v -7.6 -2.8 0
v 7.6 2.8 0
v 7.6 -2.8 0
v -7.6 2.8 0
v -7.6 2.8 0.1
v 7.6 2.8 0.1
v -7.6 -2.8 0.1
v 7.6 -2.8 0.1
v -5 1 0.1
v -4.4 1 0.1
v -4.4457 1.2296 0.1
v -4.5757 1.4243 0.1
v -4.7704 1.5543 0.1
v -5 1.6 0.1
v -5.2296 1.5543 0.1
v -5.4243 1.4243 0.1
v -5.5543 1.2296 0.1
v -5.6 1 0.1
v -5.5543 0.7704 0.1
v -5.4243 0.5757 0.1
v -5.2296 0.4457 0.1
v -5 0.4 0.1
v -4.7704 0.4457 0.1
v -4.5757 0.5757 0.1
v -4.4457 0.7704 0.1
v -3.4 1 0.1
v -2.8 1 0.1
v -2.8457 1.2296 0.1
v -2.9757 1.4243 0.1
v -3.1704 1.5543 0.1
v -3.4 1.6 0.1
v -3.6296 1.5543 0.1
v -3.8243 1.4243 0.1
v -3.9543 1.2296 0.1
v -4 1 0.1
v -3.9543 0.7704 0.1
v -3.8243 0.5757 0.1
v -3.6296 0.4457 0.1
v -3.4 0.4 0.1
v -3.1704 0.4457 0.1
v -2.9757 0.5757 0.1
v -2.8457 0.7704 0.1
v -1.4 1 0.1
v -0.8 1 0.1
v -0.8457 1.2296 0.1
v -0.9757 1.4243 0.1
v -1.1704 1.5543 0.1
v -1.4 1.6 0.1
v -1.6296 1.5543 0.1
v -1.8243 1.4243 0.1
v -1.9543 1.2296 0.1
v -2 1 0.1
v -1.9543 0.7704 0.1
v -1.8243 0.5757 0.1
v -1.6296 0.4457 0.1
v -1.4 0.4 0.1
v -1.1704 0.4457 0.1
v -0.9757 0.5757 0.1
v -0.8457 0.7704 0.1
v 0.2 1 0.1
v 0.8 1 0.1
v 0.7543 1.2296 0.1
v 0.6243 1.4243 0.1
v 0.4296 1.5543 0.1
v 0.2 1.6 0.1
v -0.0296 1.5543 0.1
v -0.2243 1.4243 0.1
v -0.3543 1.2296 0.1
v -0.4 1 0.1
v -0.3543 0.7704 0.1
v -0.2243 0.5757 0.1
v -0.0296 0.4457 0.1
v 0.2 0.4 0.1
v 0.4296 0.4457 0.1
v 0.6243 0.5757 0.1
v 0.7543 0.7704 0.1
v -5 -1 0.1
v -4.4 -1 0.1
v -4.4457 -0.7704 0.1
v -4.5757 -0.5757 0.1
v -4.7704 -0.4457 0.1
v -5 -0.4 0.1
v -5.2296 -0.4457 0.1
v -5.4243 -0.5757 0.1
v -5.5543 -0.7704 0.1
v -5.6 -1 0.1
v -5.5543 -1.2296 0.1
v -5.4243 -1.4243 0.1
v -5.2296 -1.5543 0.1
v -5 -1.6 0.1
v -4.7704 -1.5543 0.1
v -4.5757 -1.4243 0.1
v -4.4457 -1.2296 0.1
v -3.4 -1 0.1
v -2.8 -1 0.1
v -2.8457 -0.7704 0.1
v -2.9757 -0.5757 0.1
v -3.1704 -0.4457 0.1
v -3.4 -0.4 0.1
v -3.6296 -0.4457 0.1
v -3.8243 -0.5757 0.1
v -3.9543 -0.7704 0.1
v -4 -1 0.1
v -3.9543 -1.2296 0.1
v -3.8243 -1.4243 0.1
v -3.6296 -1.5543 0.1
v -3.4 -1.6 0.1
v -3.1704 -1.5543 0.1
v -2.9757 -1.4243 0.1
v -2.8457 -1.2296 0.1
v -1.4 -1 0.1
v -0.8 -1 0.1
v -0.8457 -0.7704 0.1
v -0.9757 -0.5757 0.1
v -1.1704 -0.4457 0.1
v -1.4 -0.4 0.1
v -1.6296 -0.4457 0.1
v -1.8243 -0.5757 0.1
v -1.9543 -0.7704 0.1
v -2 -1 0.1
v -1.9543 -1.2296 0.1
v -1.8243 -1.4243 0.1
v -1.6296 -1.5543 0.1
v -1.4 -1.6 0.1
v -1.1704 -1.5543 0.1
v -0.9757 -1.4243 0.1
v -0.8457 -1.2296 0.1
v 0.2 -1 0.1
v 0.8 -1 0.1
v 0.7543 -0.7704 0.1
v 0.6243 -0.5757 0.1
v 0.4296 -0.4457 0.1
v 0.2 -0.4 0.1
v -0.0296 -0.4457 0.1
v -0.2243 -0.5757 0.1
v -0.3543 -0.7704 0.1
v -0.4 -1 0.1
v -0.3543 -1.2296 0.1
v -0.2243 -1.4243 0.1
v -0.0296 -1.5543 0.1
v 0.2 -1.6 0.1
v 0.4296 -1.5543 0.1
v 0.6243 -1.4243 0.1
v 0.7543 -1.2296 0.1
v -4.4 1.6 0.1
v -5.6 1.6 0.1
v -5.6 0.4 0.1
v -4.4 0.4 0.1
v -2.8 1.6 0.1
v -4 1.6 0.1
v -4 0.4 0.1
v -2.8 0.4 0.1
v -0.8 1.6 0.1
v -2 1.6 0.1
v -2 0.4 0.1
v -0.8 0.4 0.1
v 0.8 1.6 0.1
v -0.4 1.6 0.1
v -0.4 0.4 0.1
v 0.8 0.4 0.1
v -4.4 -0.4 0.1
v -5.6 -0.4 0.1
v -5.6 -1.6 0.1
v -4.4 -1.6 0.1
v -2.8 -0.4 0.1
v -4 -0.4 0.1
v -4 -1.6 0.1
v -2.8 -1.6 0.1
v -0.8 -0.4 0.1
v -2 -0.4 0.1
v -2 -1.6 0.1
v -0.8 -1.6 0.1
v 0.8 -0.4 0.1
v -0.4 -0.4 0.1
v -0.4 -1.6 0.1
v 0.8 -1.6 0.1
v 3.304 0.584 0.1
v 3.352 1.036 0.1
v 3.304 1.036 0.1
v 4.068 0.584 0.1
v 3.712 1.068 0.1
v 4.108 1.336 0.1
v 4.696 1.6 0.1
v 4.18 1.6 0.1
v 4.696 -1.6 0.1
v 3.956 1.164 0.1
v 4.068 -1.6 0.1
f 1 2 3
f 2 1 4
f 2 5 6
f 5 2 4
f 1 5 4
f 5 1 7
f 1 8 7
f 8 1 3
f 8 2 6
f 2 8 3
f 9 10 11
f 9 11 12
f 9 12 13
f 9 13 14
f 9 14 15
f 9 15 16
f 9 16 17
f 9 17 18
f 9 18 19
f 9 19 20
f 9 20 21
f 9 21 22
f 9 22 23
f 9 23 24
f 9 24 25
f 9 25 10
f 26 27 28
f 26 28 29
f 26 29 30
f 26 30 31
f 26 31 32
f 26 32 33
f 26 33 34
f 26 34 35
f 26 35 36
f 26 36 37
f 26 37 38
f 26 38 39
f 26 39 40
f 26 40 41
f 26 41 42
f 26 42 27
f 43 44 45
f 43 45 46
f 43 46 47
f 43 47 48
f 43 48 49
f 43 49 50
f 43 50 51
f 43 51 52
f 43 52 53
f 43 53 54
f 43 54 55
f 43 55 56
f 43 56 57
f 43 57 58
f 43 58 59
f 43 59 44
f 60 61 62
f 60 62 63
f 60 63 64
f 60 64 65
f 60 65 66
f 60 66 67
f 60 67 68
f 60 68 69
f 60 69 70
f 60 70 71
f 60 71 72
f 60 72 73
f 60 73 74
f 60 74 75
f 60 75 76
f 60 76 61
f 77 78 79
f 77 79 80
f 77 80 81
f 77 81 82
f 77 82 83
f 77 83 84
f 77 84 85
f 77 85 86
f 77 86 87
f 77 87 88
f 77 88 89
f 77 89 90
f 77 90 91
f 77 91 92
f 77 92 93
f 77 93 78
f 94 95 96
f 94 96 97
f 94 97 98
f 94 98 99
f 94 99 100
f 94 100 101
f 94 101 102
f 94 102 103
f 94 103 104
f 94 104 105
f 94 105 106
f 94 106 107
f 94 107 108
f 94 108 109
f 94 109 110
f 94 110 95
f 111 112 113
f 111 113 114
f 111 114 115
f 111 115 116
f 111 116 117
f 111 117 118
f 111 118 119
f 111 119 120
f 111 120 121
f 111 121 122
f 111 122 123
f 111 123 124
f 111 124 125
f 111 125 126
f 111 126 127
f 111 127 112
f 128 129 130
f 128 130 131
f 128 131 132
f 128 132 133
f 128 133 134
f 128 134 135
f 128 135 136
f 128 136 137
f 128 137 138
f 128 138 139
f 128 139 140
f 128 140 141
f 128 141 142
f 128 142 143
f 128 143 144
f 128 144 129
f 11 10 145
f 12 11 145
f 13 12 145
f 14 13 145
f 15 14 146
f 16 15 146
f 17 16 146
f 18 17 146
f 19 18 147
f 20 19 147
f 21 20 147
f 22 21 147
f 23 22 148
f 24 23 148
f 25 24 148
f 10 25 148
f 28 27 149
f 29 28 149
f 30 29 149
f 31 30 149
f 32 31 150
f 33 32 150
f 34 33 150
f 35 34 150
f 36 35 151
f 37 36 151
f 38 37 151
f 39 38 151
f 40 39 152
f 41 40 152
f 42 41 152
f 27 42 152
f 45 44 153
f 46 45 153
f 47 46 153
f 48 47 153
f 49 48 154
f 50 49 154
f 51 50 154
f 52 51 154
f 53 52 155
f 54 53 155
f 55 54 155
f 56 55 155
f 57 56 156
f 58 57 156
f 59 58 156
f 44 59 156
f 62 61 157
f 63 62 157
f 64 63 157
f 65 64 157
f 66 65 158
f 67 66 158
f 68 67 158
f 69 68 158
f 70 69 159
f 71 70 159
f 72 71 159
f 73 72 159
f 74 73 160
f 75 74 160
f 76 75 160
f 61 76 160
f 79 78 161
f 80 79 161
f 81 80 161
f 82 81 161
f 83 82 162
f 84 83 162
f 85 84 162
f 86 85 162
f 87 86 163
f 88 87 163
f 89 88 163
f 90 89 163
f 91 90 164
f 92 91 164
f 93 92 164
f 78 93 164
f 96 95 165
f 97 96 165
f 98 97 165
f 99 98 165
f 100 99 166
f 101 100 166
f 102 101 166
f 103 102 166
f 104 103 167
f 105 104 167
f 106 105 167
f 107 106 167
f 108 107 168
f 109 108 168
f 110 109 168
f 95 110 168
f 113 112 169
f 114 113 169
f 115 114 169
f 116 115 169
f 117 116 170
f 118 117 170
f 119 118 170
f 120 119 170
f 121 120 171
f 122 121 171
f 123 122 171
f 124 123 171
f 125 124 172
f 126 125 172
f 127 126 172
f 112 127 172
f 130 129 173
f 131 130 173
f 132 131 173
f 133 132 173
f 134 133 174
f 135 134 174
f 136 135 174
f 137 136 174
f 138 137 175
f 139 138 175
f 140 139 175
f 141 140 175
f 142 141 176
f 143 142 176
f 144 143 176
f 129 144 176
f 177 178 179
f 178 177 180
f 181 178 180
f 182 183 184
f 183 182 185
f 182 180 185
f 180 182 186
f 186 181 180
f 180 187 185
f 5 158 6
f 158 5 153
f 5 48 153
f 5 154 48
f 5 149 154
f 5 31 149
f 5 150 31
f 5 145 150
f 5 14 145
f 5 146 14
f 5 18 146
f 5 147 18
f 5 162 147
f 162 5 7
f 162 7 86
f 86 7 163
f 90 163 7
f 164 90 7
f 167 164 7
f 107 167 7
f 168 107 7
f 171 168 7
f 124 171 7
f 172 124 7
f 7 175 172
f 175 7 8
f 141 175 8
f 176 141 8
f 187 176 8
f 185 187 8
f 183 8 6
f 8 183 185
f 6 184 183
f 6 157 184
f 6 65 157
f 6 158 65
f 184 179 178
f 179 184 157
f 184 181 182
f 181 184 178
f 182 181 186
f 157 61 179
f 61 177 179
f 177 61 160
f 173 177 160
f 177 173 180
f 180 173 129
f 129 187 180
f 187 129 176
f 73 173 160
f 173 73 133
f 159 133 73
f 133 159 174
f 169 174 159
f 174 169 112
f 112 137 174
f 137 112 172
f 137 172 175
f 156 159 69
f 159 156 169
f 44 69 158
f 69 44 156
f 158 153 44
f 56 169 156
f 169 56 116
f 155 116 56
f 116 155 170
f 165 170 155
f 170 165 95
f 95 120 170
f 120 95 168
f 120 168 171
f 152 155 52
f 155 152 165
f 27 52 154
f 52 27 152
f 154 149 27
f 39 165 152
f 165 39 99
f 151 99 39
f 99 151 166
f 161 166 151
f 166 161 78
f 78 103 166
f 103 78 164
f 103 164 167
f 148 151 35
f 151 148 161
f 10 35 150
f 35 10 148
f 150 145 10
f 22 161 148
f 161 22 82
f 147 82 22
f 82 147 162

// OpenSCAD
// file: ../p/box5-12.scad
use <../lib.scad>
function ldraw_lib__box5_12() = [
// 0 Box with 5 Faces without Any Edges
// 0 Name: box5-12.dat
// 0 Author: Chris Dee [cwdee]
// 0 !LDRAW_ORG Primitive UPDATE 2009-02
// 0 !LICENSE Licensed under CC BY 4.0 : see CAreadme.txt
// 
// 0 BFC CERTIFY CCW
  [0,"BFC","CERTIFY"],
  [0,"BFC","CCW"],
// 
// 0 !HISTORY 2009-09-03 [PTadmin] Official Update 2009-02
// 
// 
// 4 16 1 1 1 1 1 -1 -1 1 -1 -1 1 1
  [4,16,1,1,1,1,1,-1,-1,1,-1,-1,1,1],
// 4 16 -1 0 1 1 0 1 1 1 1 -1 1 1
  [4,16,-1,0,1,1,0,1,1,1,1,-1,1,1],
// 4 16 -1 0 -1 -1 0 1 -1 1 1 -1 1 -1
  [4,16,-1,0,-1,-1,0,1,-1,1,1,-1,1,-1],
// 4 16 1 0 -1 -1 0 -1 -1 1 -1 1 1 -1
  [4,16,1,0,-1,-1,0,-1,-1,1,-1,1,1,-1],
// 4 16 1 0 1 1 0 -1 1 1 -1 1 1 1
  [4,16,1,0,1,1,0,-1,1,1,-1,1,1,1],
// 0
];
module ldraw_lib__box5_12(step=0, col=false, unit=2/5, alt=false, line=0.2, solid=!$preview)
    makepoly(ldraw_lib__box5_12(), step=step, col=col, unit=unit, alt=alt, line=line, solid=solid);
ldraw_lib__box5_12(line=0.2);
// file: ../p/4-4ndis.scad
use <../lib.scad>
function ldraw_lib__4_4ndis() = [
// 0 Disc Negative 1.0
// 0 Name: 4-4ndis.dat
// 0 Author: James Jessiman
// 0 !LDRAW_ORG Primitive UPDATE 2012-01
// 0 !LICENSE Licensed under CC BY 4.0 : see CAreadme.txt
// 
// 0 BFC CERTIFY CCW
  [0,"BFC","CERTIFY"],
  [0,"BFC","CCW"],
// 
// 0 !HISTORY 2002-03-23 [sbliss] Added BFC statement; compacted code
// 0 !HISTORY 2002-04-25 [PTadmin] Official Update 2002-02
// 0 !HISTORY 2007-06-24 [PTadmin] Header formatted for Contributor Agreement
// 0 !HISTORY 2008-07-01 [PTadmin] Official Update 2008-01
// 0 !HISTORY 2012-02-16 [Philo] Changed to CCW
// 0 !HISTORY 2012-03-30 [PTadmin] Official Update 2012-01
// 
// 
// 3 16 0.9239 0 0.3827 1 0 0 1 0 1
  [3,16,0.9239,0,0.3827,1,0,0,1,0,1],
// 3 16 0.7071 0 0.7071 0.9239 0 0.3827 1 0 1
  [3,16,0.7071,0,0.7071,0.9239,0,0.3827,1,0,1],
// 3 16 0.3827 0 0.9239 0.7071 0 0.7071 1 0 1
  [3,16,0.3827,0,0.9239,0.7071,0,0.7071,1,0,1],
// 3 16 0 0 1 0.3827 0 0.9239 1 0 1
  [3,16,0,0,1,0.3827,0,0.9239,1,0,1],
// 3 16 -0.3827 0 0.9239 0 0 1 -1 0 1
  [3,16,-0.3827,0,0.9239,0,0,1,-1,0,1],
// 3 16 -0.7071 0 0.7071 -0.3827 0 0.9239 -1 0 1
  [3,16,-0.7071,0,0.7071,-0.3827,0,0.9239,-1,0,1],
// 3 16 -0.9239 0 0.3827 -0.7071 0 0.7071 -1 0 1
  [3,16,-0.9239,0,0.3827,-0.7071,0,0.7071,-1,0,1],
// 3 16 -1 0 0 -0.9239 0 0.3827 -1 0 1
  [3,16,-1,0,0,-0.9239,0,0.3827,-1,0,1],
// 3 16 -0.9239 0 -0.3827 -1 0 0 -1 0 -1
  [3,16,-0.9239,0,-0.3827,-1,0,0,-1,0,-1],
// 3 16 -0.7071 0 -0.7071 -0.9239 0 -0.3827 -1 0 -1
  [3,16,-0.7071,0,-0.7071,-0.9239,0,-0.3827,-1,0,-1],
// 3 16 -0.3827 0 -0.9239 -0.7071 0 -0.7071 -1 0 -1
  [3,16,-0.3827,0,-0.9239,-0.7071,0,-0.7071,-1,0,-1],
// 3 16 0 0 -1 -0.3827 0 -0.9239 -1 0 -1
  [3,16,0,0,-1,-0.3827,0,-0.9239,-1,0,-1],
// 3 16 0.3827 0 -0.9239 0 0 -1 1 0 -1
  [3,16,0.3827,0,-0.9239,0,0,-1,1,0,-1],
// 3 16 0.7071 0 -0.7071 0.3827 0 -0.9239 1 0 -1
  [3,16,0.7071,0,-0.7071,0.3827,0,-0.9239,1,0,-1],
// 3 16 0.9239 0 -0.3827 0.7071 0 -0.7071 1 0 -1
  [3,16,0.9239,0,-0.3827,0.7071,0,-0.7071,1,0,-1],
// 3 16 1 0 0 0.9239 0 -0.3827 1 0 -1
  [3,16,1,0,0,0.9239,0,-0.3827,1,0,-1],
];
module ldraw_lib__4_4ndis(step=0, col=false, unit=2/5, alt=false, line=0.2, solid=!$preview)
    makepoly(ldraw_lib__4_4ndis(), step=step, col=col, unit=unit, alt=alt, line=line, solid=solid);
ldraw_lib__4_4ndis(line=0.2);
// file: ../p/4-4disc.scad
use <../lib.scad>
function ldraw_lib__4_4disc() = [
// 0 Disc 1.0
// 0 Name: 4-4disc.dat
// 0 Author: James Jessiman
// 0 !LDRAW_ORG Primitive UPDATE 2002-02
// 0 !LICENSE Licensed under CC BY 4.0 : see CAreadme.txt
// 
// 0 BFC CERTIFY CCW
  [0,"BFC","CERTIFY"],
  [0,"BFC","CCW"],
// 
// 0 !HISTORY 1998-12-15 [PTadmin] Official Update 1998-10
// 0 !HISTORY 2002-03-23 [sbliss] Added BFC statement
// 0 !HISTORY 2002-04-25 [PTadmin] Official Update 2002-02
// 0 !HISTORY 2007-06-24 [PTadmin] Header formatted for Contributor Agreement
// 0 !HISTORY 2008-07-01 [PTadmin] Official Update 2008-01
// 
// 
// 3 16 0 0 0 1 0 0 0.9239 0 0.3827
  [3,16,0,0,0,1,0,0,0.9239,0,0.3827],
// 3 16 0 0 0 0.9239 0 0.3827 0.7071 0 0.7071
  [3,16,0,0,0,0.9239,0,0.3827,0.7071,0,0.7071],
// 3 16 0 0 0 0.7071 0 0.7071 0.3827 0 0.9239
  [3,16,0,0,0,0.7071,0,0.7071,0.3827,0,0.9239],
// 3 16 0 0 0 0.3827 0 0.9239 0 0 1
  [3,16,0,0,0,0.3827,0,0.9239,0,0,1],
// 3 16 0 0 0 0 0 1 -0.3827 0 0.9239
  [3,16,0,0,0,0,0,1,-0.3827,0,0.9239],
// 3 16 0 0 0 -0.3827 0 0.9239 -0.7071 0 0.7071
  [3,16,0,0,0,-0.3827,0,0.9239,-0.7071,0,0.7071],
// 3 16 0 0 0 -0.7071 0 0.7071 -0.9239 0 0.3827
  [3,16,0,0,0,-0.7071,0,0.7071,-0.9239,0,0.3827],
// 3 16 0 0 0 -0.9239 0 0.3827 -1 0 -0
  [3,16,0,0,0,-0.9239,0,0.3827,-1,0,-0],
// 3 16 0 0 0 -1 0 -0 -0.9239 0 -0.3827
  [3,16,0,0,0,-1,0,-0,-0.9239,0,-0.3827],
// 3 16 0 0 0 -0.9239 0 -0.3827 -0.7071 0 -0.7071
  [3,16,0,0,0,-0.9239,0,-0.3827,-0.7071,0,-0.7071],
// 3 16 0 0 0 -0.7071 0 -0.7071 -0.3827 0 -0.9239
  [3,16,0,0,0,-0.7071,0,-0.7071,-0.3827,0,-0.9239],
// 3 16 0 0 0 -0.3827 0 -0.9239 0 0 -1
  [3,16,0,0,0,-0.3827,0,-0.9239,0,0,-1],
// 3 16 0 0 0 0 0 -1 0.3827 0 -0.9239
  [3,16,0,0,0,0,0,-1,0.3827,0,-0.9239],
// 3 16 0 0 0 0.3827 0 -0.9239 0.7071 0 -0.7071
  [3,16,0,0,0,0.3827,0,-0.9239,0.7071,0,-0.7071],
// 3 16 0 0 0 0.7071 0 -0.7071 0.9239 0 -0.3827
  [3,16,0,0,0,0.7071,0,-0.7071,0.9239,0,-0.3827],
// 3 16 0 0 0 0.9239 0 -0.3827 1 0 0
  [3,16,0,0,0,0.9239,0,-0.3827,1,0,0],
// 0
];
module ldraw_lib__4_4disc(step=0, col=false, unit=2/5, alt=false, line=0.2, solid=!$preview)
    makepoly(ldraw_lib__4_4disc(), step=step, col=col, unit=unit, alt=alt, line=line, solid=solid);
ldraw_lib__4_4disc(line=0.2);
// main file
use <../lib.scad>
use <../p/4-4disc.scad>
use <../p/4-4ndis.scad>
use <../p/box5-12.scad>
function ldraw_lib__195555c() = [
// 0 Sticker  0.7 x  1.9 with White Dots and Number 1 on Black Background
// 0 Name: 195555c.dat
// 0 Author: Takeshi Takahashi [RainbowDolphin]
// 0 !LDRAW_ORG Part UPDATE 2025-03
// 0 !LICENSE Licensed under CC BY 4.0 : see CAreadme.txt
// 
// 0 BFC CERTIFY CCW
  [0,"BFC","CERTIFY"],
  [0,"BFC","CCW"],
// 
// 0 !KEYWORDS Bricklink 6371stk01, Brickowl 584391, Gas pump, Rebrickable 195555
// 0 !KEYWORDS Service station, Set 6371
// 
// 0 !HISTORY 2025-03-30 [OrionP] Official Update 2025-03
// 
// 
// 1 16 0 -0.25 0 19 0 0 0 0.25 0 0 0 7 box5-12.dat
  [1,16,0,-0.25,0,19,0,0,0,0.25,0,0,0,7, ldraw_lib__box5_12()],
// 1 15 -12.5 -0.25 2.5 1.5 0 0 0 1 0 0 0 1.5 4-4disc.dat
  [1,15,-12.5,-0.25,2.5,1.5,0,0,0,1,0,0,0,1.5, ldraw_lib__4_4disc()],
// 1 15 -8.5 -0.25 2.5 1.5 0 0 0 1 0 0 0 1.5 4-4disc.dat
  [1,15,-8.5,-0.25,2.5,1.5,0,0,0,1,0,0,0,1.5, ldraw_lib__4_4disc()],
// 1 15 -3.5 -0.25 2.5 1.5 0 0 0 1 0 0 0 1.5 4-4disc.dat
  [1,15,-3.5,-0.25,2.5,1.5,0,0,0,1,0,0,0,1.5, ldraw_lib__4_4disc()],
// 1 15 0.5 -0.25 2.5 1.5 0 0 0 1 0 0 0 1.5 4-4disc.dat
  [1,15,0.5,-0.25,2.5,1.5,0,0,0,1,0,0,0,1.5, ldraw_lib__4_4disc()],
// 1 15 -12.5 -0.25 -2.5 1.5 0 0 0 1 0 0 0 1.5 4-4disc.dat
  [1,15,-12.5,-0.25,-2.5,1.5,0,0,0,1,0,0,0,1.5, ldraw_lib__4_4disc()],
// 1 15 -8.5 -0.25 -2.5 1.5 0 0 0 1 0 0 0 1.5 4-4disc.dat
  [1,15,-8.5,-0.25,-2.5,1.5,0,0,0,1,0,0,0,1.5, ldraw_lib__4_4disc()],
// 1 15 -3.5 -0.25 -2.5 1.5 0 0 0 1 0 0 0 1.5 4-4disc.dat
  [1,15,-3.5,-0.25,-2.5,1.5,0,0,0,1,0,0,0,1.5, ldraw_lib__4_4disc()],
// 1 15 0.5 -0.25 -2.5 1.5 0 0 0 1 0 0 0 1.5 4-4disc.dat
  [1,15,0.5,-0.25,-2.5,1.5,0,0,0,1,0,0,0,1.5, ldraw_lib__4_4disc()],
// 1 0 -12.5 -0.25 2.5 1.5 0 0 0 1 0 0 0 1.5 4-4ndis.dat
  [1,0,-12.5,-0.25,2.5,1.5,0,0,0,1,0,0,0,1.5, ldraw_lib__4_4ndis()],
// 1 0 -8.5 -0.25 2.5 1.5 0 0 0 1 0 0 0 1.5 4-4ndis.dat
  [1,0,-8.5,-0.25,2.5,1.5,0,0,0,1,0,0,0,1.5, ldraw_lib__4_4ndis()],
// 1 0 -3.5 -0.25 2.5 1.5 0 0 0 1 0 0 0 1.5 4-4ndis.dat
  [1,0,-3.5,-0.25,2.5,1.5,0,0,0,1,0,0,0,1.5, ldraw_lib__4_4ndis()],
// 1 0 0.5 -0.25 2.5 1.5 0 0 0 1 0 0 0 1.5 4-4ndis.dat
  [1,0,0.5,-0.25,2.5,1.5,0,0,0,1,0,0,0,1.5, ldraw_lib__4_4ndis()],
// 1 0 -12.5 -0.25 -2.5 1.5 0 0 0 1 0 0 0 1.5 4-4ndis.dat
  [1,0,-12.5,-0.25,-2.5,1.5,0,0,0,1,0,0,0,1.5, ldraw_lib__4_4ndis()],
// 1 0 -8.5 -0.25 -2.5 1.5 0 0 0 1 0 0 0 1.5 4-4ndis.dat
  [1,0,-8.5,-0.25,-2.5,1.5,0,0,0,1,0,0,0,1.5, ldraw_lib__4_4ndis()],
// 1 0 -3.5 -0.25 -2.5 1.5 0 0 0 1 0 0 0 1.5 4-4ndis.dat
  [1,0,-3.5,-0.25,-2.5,1.5,0,0,0,1,0,0,0,1.5, ldraw_lib__4_4ndis()],
// 1 0 0.5 -0.25 -2.5 1.5 0 0 0 1 0 0 0 1.5 4-4ndis.dat
  [1,0,0.5,-0.25,-2.5,1.5,0,0,0,1,0,0,0,1.5, ldraw_lib__4_4ndis()],
// 4 15 8.38 -0.25 2.59 8.26 -0.25 2.59 8.26 -0.25 1.46 10.17 -0.25 1.46
  [4,15,8.38,-0.25,2.59,8.26,-0.25,2.59,8.26,-0.25,1.46,10.17,-0.25,1.46],
// 3 15 9.28 -0.25 2.67 8.38 -0.25 2.59 10.17 -0.25 1.46
  [3,15,9.28,-0.25,2.67,8.38,-0.25,2.59,10.17,-0.25,1.46],
// 4 15 10.27 -0.25 3.34 11.74 -0.25 -4 11.74 -0.25 4 10.45 -0.25 4
  [4,15,10.27,-0.25,3.34,11.74,-0.25,-4,11.74,-0.25,4,10.45,-0.25,4],
// 4 15 10.17 -0.25 1.46 11.74 -0.25 -4 10.27 -0.25 3.34 9.89 -0.25 2.91
  [4,15,10.17,-0.25,1.46,11.74,-0.25,-4,10.27,-0.25,3.34,9.89,-0.25,2.91],
// 3 15 9.89 -0.25 2.91 9.28 -0.25 2.67 10.17 -0.25 1.46
  [3,15,9.89,-0.25,2.91,9.28,-0.25,2.67,10.17,-0.25,1.46],
// 3 15 10.17 -0.25 1.46 10.17 -0.25 -4 11.74 -0.25 -4
  [3,15,10.17,-0.25,1.46,10.17,-0.25,-4,11.74,-0.25,-4],
// 4 0 -1 -0.25 4 19 -0.25 7 -19 -0.25 7 -2 -0.25 4
  [4,0,-1,-0.25,4,19,-0.25,7,-19,-0.25,7,-2,-0.25,4],
// 3 0 -19 -0.25 7 -3.5 -0.25 4 -2 -0.25 4
  [3,0,-19,-0.25,7,-3.5,-0.25,4,-2,-0.25,4],
// 3 0 -19 -0.25 7 -5 -0.25 4 -3.5 -0.25 4
  [3,0,-19,-0.25,7,-5,-0.25,4,-3.5,-0.25,4],
// 3 0 -19 -0.25 7 -7 -0.25 4 -5 -0.25 4
  [3,0,-19,-0.25,7,-7,-0.25,4,-5,-0.25,4],
// 3 0 -19 -0.25 7 -8.5 -0.25 4 -7 -0.25 4
  [3,0,-19,-0.25,7,-8.5,-0.25,4,-7,-0.25,4],
// 3 0 -19 -0.25 7 -10 -0.25 4 -8.5 -0.25 4
  [3,0,-19,-0.25,7,-10,-0.25,4,-8.5,-0.25,4],
// 3 0 -19 -0.25 7 -11 -0.25 4 -10 -0.25 4
  [3,0,-19,-0.25,7,-11,-0.25,4,-10,-0.25,4],
// 3 0 -19 -0.25 7 -12.5 -0.25 4 -11 -0.25 4
  [3,0,-19,-0.25,7,-12.5,-0.25,4,-11,-0.25,4],
// 3 0 -19 -0.25 7 -14 -0.25 4 -12.5 -0.25 4
  [3,0,-19,-0.25,7,-14,-0.25,4,-12.5,-0.25,4],
// 3 0 -19 -0.25 7 -14 -0.25 2.5 -14 -0.25 4
  [3,0,-19,-0.25,7,-14,-0.25,2.5,-14,-0.25,4],
// 3 0 -19 -0.25 7 -14 -0.25 1 -14 -0.25 2.5
  [3,0,-19,-0.25,7,-14,-0.25,1,-14,-0.25,2.5],
// 4 0 -14 -0.25 -1 -14 -0.25 1 -19 -0.25 7 -19 -0.25 -7
  [4,0,-14,-0.25,-1,-14,-0.25,1,-19,-0.25,7,-19,-0.25,-7],
// 3 0 -14 -0.25 -1 -19 -0.25 -7 -14 -0.25 -2.5
  [3,0,-14,-0.25,-1,-19,-0.25,-7,-14,-0.25,-2.5],
// 3 0 -14 -0.25 -2.5 -19 -0.25 -7 -14 -0.25 -4
  [3,0,-14,-0.25,-2.5,-19,-0.25,-7,-14,-0.25,-4],
// 3 0 -12.5 -0.25 -4 -14 -0.25 -4 -19 -0.25 -7
  [3,0,-12.5,-0.25,-4,-14,-0.25,-4,-19,-0.25,-7],
// 3 0 -11 -0.25 -4 -12.5 -0.25 -4 -19 -0.25 -7
  [3,0,-11,-0.25,-4,-12.5,-0.25,-4,-19,-0.25,-7],
// 3 0 -10 -0.25 -4 -11 -0.25 -4 -19 -0.25 -7
  [3,0,-10,-0.25,-4,-11,-0.25,-4,-19,-0.25,-7],
// 3 0 -8.5 -0.25 -4 -10 -0.25 -4 -19 -0.25 -7
  [3,0,-8.5,-0.25,-4,-10,-0.25,-4,-19,-0.25,-7],
// 3 0 -7 -0.25 -4 -8.5 -0.25 -4 -19 -0.25 -7
  [3,0,-7,-0.25,-4,-8.5,-0.25,-4,-19,-0.25,-7],
// 3 0 -5 -0.25 -4 -7 -0.25 -4 -19 -0.25 -7
  [3,0,-5,-0.25,-4,-7,-0.25,-4,-19,-0.25,-7],
// 3 0 -3.5 -0.25 -4 -5 -0.25 -4 -19 -0.25 -7
  [3,0,-3.5,-0.25,-4,-5,-0.25,-4,-19,-0.25,-7],
// 3 0 -2 -0.25 -4 -3.5 -0.25 -4 -19 -0.25 -7
  [3,0,-2,-0.25,-4,-3.5,-0.25,-4,-19,-0.25,-7],
// 4 0 -1 -0.25 -4 -2 -0.25 -4 -19 -0.25 -7 19 -0.25 -7
  [4,0,-1,-0.25,-4,-2,-0.25,-4,-19,-0.25,-7,19,-0.25,-7],
// 3 0 0.5 -0.25 -4 -1 -0.25 -4 19 -0.25 -7
  [3,0,0.5,-0.25,-4,-1,-0.25,-4,19,-0.25,-7],
// 3 0 2 -0.25 -4 0.5 -0.25 -4 19 -0.25 -7
  [3,0,2,-0.25,-4,0.5,-0.25,-4,19,-0.25,-7],
// 3 0 10.17 -0.25 -4 2 -0.25 -4 19 -0.25 -7
  [3,0,10.17,-0.25,-4,2,-0.25,-4,19,-0.25,-7],
// 3 0 11.74 -0.25 -4 10.17 -0.25 -4 19 -0.25 -7
  [3,0,11.74,-0.25,-4,10.17,-0.25,-4,19,-0.25,-7],
// 4 0 11.74 -0.25 4 11.74 -0.25 -4 19 -0.25 -7 19 -0.25 7
  [4,0,11.74,-0.25,4,11.74,-0.25,-4,19,-0.25,-7,19,-0.25,7],
// 3 0 19 -0.25 7 10.45 -0.25 4 11.74 -0.25 4
  [3,0,19,-0.25,7,10.45,-0.25,4,11.74,-0.25,4],
// 3 0 19 -0.25 7 2 -0.25 4 10.45 -0.25 4
  [3,0,19,-0.25,7,2,-0.25,4,10.45,-0.25,4],
// 3 0 19 -0.25 7 0.5 -0.25 4 2 -0.25 4
  [3,0,19,-0.25,7,0.5,-0.25,4,2,-0.25,4],
// 3 0 19 -0.25 7 -1 -0.25 4 0.5 -0.25 4
  [3,0,19,-0.25,7,-1,-0.25,4,0.5,-0.25,4],
// 4 0 10.45 -0.25 4 2 -0.25 4 8.26 -0.25 2.59 8.38 -0.25 2.59
  [4,0,10.45,-0.25,4,2,-0.25,4,8.26,-0.25,2.59,8.38,-0.25,2.59],
// 4 0 10.27 -0.25 3.34 10.45 -0.25 4 8.38 -0.25 2.59 9.28 -0.25 2.67
  [4,0,10.27,-0.25,3.34,10.45,-0.25,4,8.38,-0.25,2.59,9.28,-0.25,2.67],
// 3 0 10.27 -0.25 3.34 9.28 -0.25 2.67 9.89 -0.25 2.91
  [3,0,10.27,-0.25,3.34,9.28,-0.25,2.67,9.89,-0.25,2.91],
// 3 0 2 -0.25 4 2 -0.25 2.5 8.26 -0.25 2.59
  [3,0,2,-0.25,4,2,-0.25,2.5,8.26,-0.25,2.59],
// 4 0 8.26 -0.25 2.59 2 -0.25 2.5 2 -0.25 1 8.26 -0.25 1.46
  [4,0,8.26,-0.25,2.59,2,-0.25,2.5,2,-0.25,1,8.26,-0.25,1.46],
// 4 0 8.26 -0.25 1.46 2 -0.25 1 2 -0.25 -1 10.17 -0.25 1.46
  [4,0,8.26,-0.25,1.46,2,-0.25,1,2,-0.25,-1,10.17,-0.25,1.46],
// 3 0 10.17 -0.25 1.46 2 -0.25 -1 2 -0.25 -2.5
  [3,0,10.17,-0.25,1.46,2,-0.25,-1,2,-0.25,-2.5],
// 4 0 10.17 -0.25 1.46 2 -0.25 -2.5 2 -0.25 -4 10.17 -0.25 -4
  [4,0,10.17,-0.25,1.46,2,-0.25,-2.5,2,-0.25,-4,10.17,-0.25,-4],
// 4 0 0.5 -0.25 -1 2 -0.25 -1 2 -0.25 1 0.5 -0.25 1
  [4,0,0.5,-0.25,-1,2,-0.25,-1,2,-0.25,1,0.5,-0.25,1],
// 4 0 -1 -0.25 -1 0.5 -0.25 -1 0.5 -0.25 1 -1 -0.25 1
  [4,0,-1,-0.25,-1,0.5,-0.25,-1,0.5,-0.25,1,-1,-0.25,1],
// 4 0 -1 -0.25 -1 -1 -0.25 1 -2 -0.25 -1 -2 -0.25 -2.5
  [4,0,-1,-0.25,-1,-1,-0.25,1,-2,-0.25,-1,-2,-0.25,-2.5],
// 4 0 -1 -0.25 -2.5 -1 -0.25 -1 -2 -0.25 -2.5 -2 -0.25 -4
  [4,0,-1,-0.25,-2.5,-1,-0.25,-1,-2,-0.25,-2.5,-2,-0.25,-4],
// 3 0 -1 -0.25 -2.5 -2 -0.25 -4 -1 -0.25 -4
  [3,0,-1,-0.25,-2.5,-2,-0.25,-4,-1,-0.25,-4],
// 4 0 -2 -0.25 1 -2 -0.25 -1 -1 -0.25 1 -1 -0.25 2.5
  [4,0,-2,-0.25,1,-2,-0.25,-1,-1,-0.25,1,-1,-0.25,2.5],
// 4 0 -2 -0.25 2.5 -2 -0.25 1 -1 -0.25 2.5 -1 -0.25 4
  [4,0,-2,-0.25,2.5,-2,-0.25,1,-1,-0.25,2.5,-1,-0.25,4],
// 3 0 -1 -0.25 4 -2 -0.25 4 -2 -0.25 2.5
  [3,0,-1,-0.25,4,-2,-0.25,4,-2,-0.25,2.5],
// 4 0 -3.5 -0.25 -1 -2 -0.25 -1 -2 -0.25 1 -3.5 -0.25 1
  [4,0,-3.5,-0.25,-1,-2,-0.25,-1,-2,-0.25,1,-3.5,-0.25,1],
// 4 0 -5 -0.25 -1 -3.5 -0.25 -1 -3.5 -0.25 1 -5 -0.25 1
  [4,0,-5,-0.25,-1,-3.5,-0.25,-1,-3.5,-0.25,1,-5,-0.25,1],
// 4 0 -5 -0.25 -1 -5 -0.25 1 -7 -0.25 -1 -7 -0.25 -2.5
  [4,0,-5,-0.25,-1,-5,-0.25,1,-7,-0.25,-1,-7,-0.25,-2.5],
// 4 0 -5 -0.25 -2.5 -5 -0.25 -1 -7 -0.25 -2.5 -7 -0.25 -4
  [4,0,-5,-0.25,-2.5,-5,-0.25,-1,-7,-0.25,-2.5,-7,-0.25,-4],
// 3 0 -5 -0.25 -2.5 -7 -0.25 -4 -5 -0.25 -4
  [3,0,-5,-0.25,-2.5,-7,-0.25,-4,-5,-0.25,-4],
// 4 0 -7 -0.25 1 -7 -0.25 -1 -5 -0.25 1 -5 -0.25 2.5
  [4,0,-7,-0.25,1,-7,-0.25,-1,-5,-0.25,1,-5,-0.25,2.5],
// 4 0 -7 -0.25 2.5 -7 -0.25 1 -5 -0.25 2.5 -5 -0.25 4
  [4,0,-7,-0.25,2.5,-7,-0.25,1,-5,-0.25,2.5,-5,-0.25,4],
// 3 0 -5 -0.25 4 -7 -0.25 4 -7 -0.25 2.5
  [3,0,-5,-0.25,4,-7,-0.25,4,-7,-0.25,2.5],
// 4 0 -8.5 -0.25 -1 -7 -0.25 -1 -7 -0.25 1 -8.5 -0.25 1
  [4,0,-8.5,-0.25,-1,-7,-0.25,-1,-7,-0.25,1,-8.5,-0.25,1],
// 4 0 -10 -0.25 -1 -8.5 -0.25 -1 -8.5 -0.25 1 -10 -0.25 1
  [4,0,-10,-0.25,-1,-8.5,-0.25,-1,-8.5,-0.25,1,-10,-0.25,1],
// 4 0 -10 -0.25 -1 -10 -0.25 1 -11 -0.25 -1 -11 -0.25 -2.5
  [4,0,-10,-0.25,-1,-10,-0.25,1,-11,-0.25,-1,-11,-0.25,-2.5],
// 4 0 -10 -0.25 -2.5 -10 -0.25 -1 -11 -0.25 -2.5 -11 -0.25 -4
  [4,0,-10,-0.25,-2.5,-10,-0.25,-1,-11,-0.25,-2.5,-11,-0.25,-4],
// 3 0 -10 -0.25 -2.5 -11 -0.25 -4 -10 -0.25 -4
  [3,0,-10,-0.25,-2.5,-11,-0.25,-4,-10,-0.25,-4],
// 4 0 -11 -0.25 1 -11 -0.25 -1 -10 -0.25 1 -10 -0.25 2.5
  [4,0,-11,-0.25,1,-11,-0.25,-1,-10,-0.25,1,-10,-0.25,2.5],
// 4 0 -11 -0.25 2.5 -11 -0.25 1 -10 -0.25 2.5 -10 -0.25 4
  [4,0,-11,-0.25,2.5,-11,-0.25,1,-10,-0.25,2.5,-10,-0.25,4],
// 3 0 -10 -0.25 4 -11 -0.25 4 -11 -0.25 2.5
  [3,0,-10,-0.25,4,-11,-0.25,4,-11,-0.25,2.5],
// 4 0 -12.5 -0.25 -1 -11 -0.25 -1 -11 -0.25 1 -12.5 -0.25 1
  [4,0,-12.5,-0.25,-1,-11,-0.25,-1,-11,-0.25,1,-12.5,-0.25,1],
// 4 0 -14 -0.25 -1 -12.5 -0.25 -1 -12.5 -0.25 1 -14 -0.25 1
  [4,0,-14,-0.25,-1,-12.5,-0.25,-1,-12.5,-0.25,1,-14,-0.25,1],
];
module ldraw_lib__195555c(step=0, col=false, unit=2/5, alt=false, line=0.2, solid=!$preview)
    makepoly(ldraw_lib__195555c(), step=step, col=col, unit=unit, alt=alt, line=line, solid=solid);
ldraw_lib__195555c(line=0.2);
